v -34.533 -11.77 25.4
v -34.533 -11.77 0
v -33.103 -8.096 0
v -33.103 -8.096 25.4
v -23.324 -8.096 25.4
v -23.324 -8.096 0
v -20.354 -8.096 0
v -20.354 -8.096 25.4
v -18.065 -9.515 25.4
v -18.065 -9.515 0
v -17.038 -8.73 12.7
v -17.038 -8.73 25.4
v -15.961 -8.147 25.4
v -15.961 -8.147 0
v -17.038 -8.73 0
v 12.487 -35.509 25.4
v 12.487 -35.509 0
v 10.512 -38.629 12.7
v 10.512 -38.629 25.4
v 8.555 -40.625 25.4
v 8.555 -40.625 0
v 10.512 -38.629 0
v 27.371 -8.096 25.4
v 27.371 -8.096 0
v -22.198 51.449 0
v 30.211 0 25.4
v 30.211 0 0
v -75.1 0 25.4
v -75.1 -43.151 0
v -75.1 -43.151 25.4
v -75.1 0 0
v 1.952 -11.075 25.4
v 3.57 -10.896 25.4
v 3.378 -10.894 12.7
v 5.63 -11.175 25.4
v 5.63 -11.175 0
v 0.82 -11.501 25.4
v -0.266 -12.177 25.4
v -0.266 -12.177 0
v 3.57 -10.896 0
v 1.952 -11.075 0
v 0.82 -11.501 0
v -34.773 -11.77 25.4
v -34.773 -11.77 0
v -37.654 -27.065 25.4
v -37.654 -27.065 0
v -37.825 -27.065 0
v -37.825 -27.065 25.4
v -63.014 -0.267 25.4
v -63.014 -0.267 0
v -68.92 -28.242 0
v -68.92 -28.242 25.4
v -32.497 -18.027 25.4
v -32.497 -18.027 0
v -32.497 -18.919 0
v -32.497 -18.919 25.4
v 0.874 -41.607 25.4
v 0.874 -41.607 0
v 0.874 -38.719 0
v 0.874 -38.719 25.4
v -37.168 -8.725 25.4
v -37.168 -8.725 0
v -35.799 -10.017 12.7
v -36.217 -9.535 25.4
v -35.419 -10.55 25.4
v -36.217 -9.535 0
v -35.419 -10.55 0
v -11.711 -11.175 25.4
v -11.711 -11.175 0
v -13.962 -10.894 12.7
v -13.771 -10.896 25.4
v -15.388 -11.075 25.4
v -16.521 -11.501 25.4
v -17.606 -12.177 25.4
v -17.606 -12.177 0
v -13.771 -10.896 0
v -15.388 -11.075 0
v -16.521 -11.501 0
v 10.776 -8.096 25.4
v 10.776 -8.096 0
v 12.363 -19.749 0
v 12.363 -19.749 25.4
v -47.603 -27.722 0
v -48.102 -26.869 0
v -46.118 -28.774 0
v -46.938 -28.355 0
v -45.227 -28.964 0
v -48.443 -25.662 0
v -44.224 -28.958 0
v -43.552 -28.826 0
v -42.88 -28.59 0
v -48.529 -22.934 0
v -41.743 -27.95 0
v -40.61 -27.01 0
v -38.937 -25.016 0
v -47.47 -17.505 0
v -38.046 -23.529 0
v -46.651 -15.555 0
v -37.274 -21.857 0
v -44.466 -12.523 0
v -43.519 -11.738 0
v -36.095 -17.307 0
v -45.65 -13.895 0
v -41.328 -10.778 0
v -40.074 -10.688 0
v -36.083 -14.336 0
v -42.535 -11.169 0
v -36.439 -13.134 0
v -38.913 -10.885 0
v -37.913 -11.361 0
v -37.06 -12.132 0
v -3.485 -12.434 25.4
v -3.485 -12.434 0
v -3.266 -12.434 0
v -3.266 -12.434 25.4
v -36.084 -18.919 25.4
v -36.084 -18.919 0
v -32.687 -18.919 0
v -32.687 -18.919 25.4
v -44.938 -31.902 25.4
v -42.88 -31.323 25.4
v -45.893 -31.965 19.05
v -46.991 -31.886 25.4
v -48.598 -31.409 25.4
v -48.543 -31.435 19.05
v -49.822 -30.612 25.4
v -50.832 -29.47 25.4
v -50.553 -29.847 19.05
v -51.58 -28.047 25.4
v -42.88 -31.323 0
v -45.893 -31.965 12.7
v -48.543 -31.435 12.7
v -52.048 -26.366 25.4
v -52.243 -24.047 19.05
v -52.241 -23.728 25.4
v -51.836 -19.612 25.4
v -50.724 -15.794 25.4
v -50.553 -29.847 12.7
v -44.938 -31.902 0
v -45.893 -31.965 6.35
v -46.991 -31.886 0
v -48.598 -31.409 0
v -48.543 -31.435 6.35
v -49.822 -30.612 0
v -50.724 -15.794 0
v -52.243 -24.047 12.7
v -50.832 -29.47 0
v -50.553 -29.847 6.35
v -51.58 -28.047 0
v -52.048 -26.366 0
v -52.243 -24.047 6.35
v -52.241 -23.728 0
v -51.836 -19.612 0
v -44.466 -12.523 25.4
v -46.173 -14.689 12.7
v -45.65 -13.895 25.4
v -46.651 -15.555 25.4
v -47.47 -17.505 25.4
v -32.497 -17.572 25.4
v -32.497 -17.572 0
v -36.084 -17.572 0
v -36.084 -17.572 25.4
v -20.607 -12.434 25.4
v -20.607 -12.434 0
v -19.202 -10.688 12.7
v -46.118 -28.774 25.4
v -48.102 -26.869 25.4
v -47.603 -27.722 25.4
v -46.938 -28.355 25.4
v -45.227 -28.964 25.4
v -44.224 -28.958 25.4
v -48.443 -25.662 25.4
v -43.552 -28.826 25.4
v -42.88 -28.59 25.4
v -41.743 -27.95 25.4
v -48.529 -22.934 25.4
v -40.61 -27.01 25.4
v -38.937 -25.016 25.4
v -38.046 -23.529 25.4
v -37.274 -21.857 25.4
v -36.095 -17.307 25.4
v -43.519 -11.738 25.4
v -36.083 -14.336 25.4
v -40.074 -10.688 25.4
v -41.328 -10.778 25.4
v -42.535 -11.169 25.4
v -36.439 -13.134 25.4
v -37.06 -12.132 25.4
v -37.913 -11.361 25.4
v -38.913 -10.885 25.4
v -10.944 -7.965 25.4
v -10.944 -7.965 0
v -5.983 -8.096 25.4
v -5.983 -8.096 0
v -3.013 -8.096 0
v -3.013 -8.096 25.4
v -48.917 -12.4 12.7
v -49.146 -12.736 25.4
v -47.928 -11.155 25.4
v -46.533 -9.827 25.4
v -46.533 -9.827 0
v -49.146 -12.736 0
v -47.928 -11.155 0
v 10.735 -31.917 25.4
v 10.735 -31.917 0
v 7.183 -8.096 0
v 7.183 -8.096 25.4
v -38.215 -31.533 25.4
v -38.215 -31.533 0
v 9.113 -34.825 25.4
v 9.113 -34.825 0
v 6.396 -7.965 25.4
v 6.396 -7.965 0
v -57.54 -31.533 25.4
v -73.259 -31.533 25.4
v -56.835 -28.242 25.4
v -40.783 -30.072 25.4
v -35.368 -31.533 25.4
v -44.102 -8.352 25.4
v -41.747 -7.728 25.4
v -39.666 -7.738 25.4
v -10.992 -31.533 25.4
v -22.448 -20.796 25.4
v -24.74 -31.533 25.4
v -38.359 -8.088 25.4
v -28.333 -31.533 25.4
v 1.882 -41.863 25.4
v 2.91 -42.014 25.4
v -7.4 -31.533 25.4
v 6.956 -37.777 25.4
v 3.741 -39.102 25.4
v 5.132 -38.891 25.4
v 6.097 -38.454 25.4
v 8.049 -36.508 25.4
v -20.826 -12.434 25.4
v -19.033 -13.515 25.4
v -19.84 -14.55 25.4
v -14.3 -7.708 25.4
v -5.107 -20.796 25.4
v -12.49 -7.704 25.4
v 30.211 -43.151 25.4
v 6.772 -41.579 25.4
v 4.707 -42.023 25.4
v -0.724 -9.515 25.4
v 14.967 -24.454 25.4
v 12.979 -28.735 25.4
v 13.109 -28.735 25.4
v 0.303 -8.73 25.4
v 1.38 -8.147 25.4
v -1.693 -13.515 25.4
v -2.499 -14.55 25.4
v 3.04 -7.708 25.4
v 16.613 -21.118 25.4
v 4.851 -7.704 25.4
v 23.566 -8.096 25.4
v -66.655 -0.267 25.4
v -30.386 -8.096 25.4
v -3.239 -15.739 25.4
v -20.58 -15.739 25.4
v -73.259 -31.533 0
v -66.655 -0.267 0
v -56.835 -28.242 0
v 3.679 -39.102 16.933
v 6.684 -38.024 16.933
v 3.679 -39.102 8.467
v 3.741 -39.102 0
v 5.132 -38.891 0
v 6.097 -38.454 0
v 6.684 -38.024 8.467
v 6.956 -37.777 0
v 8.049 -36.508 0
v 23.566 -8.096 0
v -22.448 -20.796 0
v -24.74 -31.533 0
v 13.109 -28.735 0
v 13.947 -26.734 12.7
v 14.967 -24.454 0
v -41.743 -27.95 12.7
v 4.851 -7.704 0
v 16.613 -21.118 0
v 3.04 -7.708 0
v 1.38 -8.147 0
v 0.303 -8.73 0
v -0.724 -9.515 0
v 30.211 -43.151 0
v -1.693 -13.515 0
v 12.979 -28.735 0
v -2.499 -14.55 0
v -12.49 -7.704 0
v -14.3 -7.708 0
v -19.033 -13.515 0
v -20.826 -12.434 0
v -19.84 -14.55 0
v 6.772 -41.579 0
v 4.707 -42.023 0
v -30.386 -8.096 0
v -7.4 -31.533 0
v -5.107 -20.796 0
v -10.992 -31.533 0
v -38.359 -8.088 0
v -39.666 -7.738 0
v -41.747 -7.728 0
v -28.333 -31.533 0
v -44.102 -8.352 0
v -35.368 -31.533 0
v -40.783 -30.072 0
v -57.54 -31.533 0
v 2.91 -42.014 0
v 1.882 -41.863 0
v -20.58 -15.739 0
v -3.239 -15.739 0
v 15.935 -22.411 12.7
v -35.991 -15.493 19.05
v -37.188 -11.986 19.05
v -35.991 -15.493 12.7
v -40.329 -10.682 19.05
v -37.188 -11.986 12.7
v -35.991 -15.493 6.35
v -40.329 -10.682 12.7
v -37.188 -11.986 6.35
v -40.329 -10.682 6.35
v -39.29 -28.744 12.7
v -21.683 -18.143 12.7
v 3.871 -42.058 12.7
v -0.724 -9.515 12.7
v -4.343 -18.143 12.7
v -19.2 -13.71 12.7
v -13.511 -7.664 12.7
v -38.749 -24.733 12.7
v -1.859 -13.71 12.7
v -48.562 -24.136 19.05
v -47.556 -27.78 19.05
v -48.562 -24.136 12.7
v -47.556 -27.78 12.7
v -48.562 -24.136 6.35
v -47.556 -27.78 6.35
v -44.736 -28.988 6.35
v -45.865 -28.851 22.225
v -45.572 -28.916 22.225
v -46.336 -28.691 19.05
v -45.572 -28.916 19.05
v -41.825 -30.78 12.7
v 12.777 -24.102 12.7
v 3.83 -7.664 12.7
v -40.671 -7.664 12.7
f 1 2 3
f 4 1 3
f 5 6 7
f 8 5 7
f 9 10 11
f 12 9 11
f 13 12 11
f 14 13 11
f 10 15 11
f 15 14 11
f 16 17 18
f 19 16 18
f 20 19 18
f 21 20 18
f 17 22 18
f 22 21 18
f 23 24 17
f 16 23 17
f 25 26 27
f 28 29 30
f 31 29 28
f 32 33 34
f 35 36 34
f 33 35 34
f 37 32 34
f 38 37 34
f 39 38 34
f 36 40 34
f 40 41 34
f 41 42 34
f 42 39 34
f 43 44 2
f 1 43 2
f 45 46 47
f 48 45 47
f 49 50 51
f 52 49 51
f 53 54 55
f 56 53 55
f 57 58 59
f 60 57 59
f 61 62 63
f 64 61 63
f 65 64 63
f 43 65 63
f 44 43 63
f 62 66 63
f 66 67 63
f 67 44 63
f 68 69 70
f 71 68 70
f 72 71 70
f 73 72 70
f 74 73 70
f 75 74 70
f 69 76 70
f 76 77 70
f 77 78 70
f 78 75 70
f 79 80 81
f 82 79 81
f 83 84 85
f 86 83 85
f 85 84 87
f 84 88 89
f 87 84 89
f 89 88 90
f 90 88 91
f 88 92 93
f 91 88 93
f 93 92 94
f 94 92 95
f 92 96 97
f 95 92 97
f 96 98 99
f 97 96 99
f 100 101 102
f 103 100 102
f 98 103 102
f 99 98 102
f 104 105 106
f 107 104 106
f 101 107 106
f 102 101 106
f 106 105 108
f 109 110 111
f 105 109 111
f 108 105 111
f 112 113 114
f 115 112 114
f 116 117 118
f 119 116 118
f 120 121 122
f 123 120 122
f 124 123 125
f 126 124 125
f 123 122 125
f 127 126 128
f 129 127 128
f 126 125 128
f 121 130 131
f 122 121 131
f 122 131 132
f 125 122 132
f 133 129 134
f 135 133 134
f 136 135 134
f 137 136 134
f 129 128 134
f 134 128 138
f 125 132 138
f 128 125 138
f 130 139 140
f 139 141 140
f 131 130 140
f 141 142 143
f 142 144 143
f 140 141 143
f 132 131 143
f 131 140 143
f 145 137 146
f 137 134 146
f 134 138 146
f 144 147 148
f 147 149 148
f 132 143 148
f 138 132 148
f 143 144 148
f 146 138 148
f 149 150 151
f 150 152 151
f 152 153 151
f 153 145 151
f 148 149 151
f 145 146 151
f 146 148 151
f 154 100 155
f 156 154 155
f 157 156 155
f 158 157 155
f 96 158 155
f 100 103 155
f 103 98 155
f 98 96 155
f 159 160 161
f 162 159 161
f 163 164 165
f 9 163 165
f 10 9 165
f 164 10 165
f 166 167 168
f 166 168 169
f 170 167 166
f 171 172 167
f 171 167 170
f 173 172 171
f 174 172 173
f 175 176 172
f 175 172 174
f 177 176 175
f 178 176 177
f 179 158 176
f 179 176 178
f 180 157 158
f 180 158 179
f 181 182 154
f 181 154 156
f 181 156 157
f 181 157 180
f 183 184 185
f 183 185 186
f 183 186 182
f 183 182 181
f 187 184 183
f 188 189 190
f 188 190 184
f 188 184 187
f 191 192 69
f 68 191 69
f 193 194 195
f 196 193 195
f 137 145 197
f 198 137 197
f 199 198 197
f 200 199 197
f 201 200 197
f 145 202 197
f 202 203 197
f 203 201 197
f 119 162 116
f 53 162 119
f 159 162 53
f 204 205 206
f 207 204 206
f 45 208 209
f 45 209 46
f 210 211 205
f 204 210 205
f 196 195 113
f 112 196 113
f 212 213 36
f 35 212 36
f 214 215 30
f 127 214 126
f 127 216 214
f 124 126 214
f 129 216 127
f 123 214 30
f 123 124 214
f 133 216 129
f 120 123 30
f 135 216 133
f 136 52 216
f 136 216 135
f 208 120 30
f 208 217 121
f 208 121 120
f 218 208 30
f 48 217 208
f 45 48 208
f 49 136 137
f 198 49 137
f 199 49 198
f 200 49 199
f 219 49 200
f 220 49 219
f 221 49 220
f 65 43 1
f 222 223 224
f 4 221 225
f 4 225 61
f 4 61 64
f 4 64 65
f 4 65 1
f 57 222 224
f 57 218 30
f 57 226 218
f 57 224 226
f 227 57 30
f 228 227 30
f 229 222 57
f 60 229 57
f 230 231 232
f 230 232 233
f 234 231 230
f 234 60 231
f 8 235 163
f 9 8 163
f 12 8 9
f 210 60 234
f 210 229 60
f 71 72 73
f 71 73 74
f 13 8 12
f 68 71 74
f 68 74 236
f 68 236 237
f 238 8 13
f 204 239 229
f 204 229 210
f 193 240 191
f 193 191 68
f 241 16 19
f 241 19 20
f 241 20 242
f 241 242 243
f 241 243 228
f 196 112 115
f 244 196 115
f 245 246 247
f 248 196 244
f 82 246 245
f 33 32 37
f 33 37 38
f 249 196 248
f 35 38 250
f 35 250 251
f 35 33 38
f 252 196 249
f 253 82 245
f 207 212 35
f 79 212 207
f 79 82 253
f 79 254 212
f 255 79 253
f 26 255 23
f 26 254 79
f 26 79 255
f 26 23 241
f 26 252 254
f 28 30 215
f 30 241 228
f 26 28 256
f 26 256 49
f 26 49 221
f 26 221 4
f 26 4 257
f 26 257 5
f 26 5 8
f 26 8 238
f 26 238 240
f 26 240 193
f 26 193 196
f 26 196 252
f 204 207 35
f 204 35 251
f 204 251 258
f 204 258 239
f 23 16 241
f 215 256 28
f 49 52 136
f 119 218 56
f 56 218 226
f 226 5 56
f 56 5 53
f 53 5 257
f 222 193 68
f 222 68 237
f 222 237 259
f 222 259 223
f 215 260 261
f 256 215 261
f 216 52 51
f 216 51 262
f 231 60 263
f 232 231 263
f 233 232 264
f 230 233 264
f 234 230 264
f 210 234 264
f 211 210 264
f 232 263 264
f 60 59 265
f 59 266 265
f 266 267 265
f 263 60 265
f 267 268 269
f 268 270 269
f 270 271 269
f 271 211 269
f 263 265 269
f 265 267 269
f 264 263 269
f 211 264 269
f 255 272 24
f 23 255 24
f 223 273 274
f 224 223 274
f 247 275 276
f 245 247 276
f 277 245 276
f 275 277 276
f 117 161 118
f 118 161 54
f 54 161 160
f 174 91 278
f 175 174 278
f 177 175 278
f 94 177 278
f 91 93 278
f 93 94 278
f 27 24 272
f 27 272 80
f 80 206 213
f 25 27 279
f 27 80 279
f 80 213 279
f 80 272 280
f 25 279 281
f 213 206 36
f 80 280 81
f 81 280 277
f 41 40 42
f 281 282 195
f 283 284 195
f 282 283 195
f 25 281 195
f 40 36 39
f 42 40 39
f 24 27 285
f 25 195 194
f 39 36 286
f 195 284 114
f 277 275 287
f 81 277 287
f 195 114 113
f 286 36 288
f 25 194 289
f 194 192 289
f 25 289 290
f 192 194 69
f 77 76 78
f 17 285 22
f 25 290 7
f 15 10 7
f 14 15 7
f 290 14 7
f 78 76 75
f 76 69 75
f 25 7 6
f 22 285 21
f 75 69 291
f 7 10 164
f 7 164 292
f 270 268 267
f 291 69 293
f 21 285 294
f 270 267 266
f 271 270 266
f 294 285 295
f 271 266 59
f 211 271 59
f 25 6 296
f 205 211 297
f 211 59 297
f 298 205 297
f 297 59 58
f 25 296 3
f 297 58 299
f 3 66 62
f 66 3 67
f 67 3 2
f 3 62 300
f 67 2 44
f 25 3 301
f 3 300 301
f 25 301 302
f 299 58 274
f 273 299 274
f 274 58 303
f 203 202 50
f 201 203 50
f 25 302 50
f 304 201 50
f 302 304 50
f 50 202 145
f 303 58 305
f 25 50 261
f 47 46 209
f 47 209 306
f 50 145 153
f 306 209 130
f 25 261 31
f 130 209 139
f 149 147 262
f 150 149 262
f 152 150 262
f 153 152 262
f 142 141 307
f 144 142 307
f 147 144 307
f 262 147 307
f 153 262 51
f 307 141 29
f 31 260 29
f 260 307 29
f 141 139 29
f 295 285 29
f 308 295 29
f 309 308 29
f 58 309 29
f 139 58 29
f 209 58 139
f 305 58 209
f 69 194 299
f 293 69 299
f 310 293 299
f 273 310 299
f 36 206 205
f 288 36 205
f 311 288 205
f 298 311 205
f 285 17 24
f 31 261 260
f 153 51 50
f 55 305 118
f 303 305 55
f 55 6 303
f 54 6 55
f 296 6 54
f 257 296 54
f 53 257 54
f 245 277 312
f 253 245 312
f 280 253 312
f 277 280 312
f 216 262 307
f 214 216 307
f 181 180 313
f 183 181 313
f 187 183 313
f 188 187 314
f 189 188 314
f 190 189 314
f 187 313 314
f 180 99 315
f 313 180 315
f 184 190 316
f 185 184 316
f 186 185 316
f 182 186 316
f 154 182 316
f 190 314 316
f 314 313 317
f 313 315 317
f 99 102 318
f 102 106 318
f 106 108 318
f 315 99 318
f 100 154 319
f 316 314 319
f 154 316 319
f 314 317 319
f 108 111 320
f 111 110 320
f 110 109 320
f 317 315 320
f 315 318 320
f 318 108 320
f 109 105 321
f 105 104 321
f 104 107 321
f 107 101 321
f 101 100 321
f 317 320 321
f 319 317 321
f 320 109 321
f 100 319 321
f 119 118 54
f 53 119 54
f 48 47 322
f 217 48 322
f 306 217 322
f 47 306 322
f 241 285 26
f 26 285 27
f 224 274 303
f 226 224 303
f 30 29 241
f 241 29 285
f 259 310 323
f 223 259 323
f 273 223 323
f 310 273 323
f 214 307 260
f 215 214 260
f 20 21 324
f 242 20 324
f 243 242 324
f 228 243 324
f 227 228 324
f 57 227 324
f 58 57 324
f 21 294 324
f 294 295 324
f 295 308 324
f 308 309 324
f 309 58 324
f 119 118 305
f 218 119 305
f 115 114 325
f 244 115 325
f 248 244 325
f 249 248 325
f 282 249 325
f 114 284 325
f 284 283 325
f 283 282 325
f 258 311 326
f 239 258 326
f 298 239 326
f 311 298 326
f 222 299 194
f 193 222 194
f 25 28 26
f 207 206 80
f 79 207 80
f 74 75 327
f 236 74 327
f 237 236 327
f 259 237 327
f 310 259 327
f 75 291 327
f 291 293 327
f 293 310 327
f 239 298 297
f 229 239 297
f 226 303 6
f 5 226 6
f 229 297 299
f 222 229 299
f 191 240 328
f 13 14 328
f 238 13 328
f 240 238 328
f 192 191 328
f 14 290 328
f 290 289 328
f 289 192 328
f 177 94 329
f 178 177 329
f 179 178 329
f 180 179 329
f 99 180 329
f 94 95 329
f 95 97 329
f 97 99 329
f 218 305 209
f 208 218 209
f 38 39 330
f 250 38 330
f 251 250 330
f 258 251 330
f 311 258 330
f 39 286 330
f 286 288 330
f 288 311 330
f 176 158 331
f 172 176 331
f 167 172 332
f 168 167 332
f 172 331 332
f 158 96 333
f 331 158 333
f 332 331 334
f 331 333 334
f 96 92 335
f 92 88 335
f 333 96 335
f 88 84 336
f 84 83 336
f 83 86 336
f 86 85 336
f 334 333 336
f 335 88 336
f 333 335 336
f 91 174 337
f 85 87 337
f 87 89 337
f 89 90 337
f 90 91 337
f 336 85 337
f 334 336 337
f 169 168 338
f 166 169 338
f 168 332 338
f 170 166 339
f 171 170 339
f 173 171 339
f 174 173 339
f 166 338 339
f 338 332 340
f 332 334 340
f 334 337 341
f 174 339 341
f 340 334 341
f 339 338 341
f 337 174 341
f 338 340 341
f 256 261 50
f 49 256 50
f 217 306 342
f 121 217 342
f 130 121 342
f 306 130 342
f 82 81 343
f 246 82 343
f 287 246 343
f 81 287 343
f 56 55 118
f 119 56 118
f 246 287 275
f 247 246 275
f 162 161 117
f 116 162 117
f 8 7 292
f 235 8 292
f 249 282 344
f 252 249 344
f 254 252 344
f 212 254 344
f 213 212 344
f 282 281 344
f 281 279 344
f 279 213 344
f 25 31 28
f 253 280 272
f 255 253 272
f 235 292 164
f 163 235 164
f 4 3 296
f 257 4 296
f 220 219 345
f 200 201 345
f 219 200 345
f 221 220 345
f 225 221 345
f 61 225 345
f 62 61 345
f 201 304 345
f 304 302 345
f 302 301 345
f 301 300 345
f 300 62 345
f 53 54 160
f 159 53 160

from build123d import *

# Parameters (mm, degrees)
F0_W      = 105.3100518572
F0_H      = 43.1510657072
F1_DEPTH  = 25.4
F1_FACE_W = 105.3100518572
F1_FACE_H = 25.4


with BuildPart() as f1:
    # F0 (on Top) → F1 (new body)
    with BuildSketch(Plane.XY):
        with Locations((-22.4444870061, -21.5755328536)):
            Rectangle(F0_W, F0_H)
        with BuildLine():
            Line((10.7347830199, -31.9166990618), (7.1831606328, -8.0955092174))
            Line((7.1831606328, -8.0955092174), (10.7758422382, -8.0955092174))
            Line((10.7758422382, -8.0955092174), (12.3634653476, -19.7494840249))
            add(Edge.make_bspline(
                [(12.3634653476, -19.7494840249), (12.5756046424, -21.2276158854), (12.7774791326, -24.1017611697)],
                knots=[0, 0, 0, 1, 1, 1], degree=2))
            add(Edge.make_bspline(
                [(12.7774791326, -24.1017611697), (12.9793536228, -26.975906454), (12.9793536228, -28.7346096399)],
                knots=[0, 0, 0, 1, 1, 1], degree=2))
            Line((12.9793536228, -28.7346096399), (13.1093744809, -28.7346096399))
            add(Edge.make_bspline(
                [(13.1093744809, -28.7346096399), (13.8552836142, -26.8732584082), (14.9673041111, -24.4541861272)],
                knots=[0, 0, 0, 1, 1, 1], degree=2))
            add(Edge.make_bspline(
                [(14.9673041111, -24.4541861272), (16.079324608, -22.0351138463), (16.6130944466, -21.1181246365)],
                knots=[0, 0, 0, 1, 1, 1], degree=2))
            Line((16.6130944466, -21.1181246365), (23.5657887533, -8.0955092174))
            Line((23.5657887533, -8.0955092174), (27.3706096535, -8.0955092174))
            Line((27.3706096535, -8.0955092174), (12.4866430027, -35.5093806672))
            add(Edge.make_bspline(
                [(12.4866430027, -35.5093806672), (10.5021141159, -39.1910239123), (8.5552228459, -40.6246749529)],
                knots=[0, 0, 0, 1, 1, 1], degree=2))
            add(Edge.make_bspline(
                [(8.5552228459, -40.6246749529), (6.608331576, -42.0583259935), (3.8710503529, -42.0583259935)],
                knots=[0, 0, 0, 1, 1, 1], degree=2))
            add(Edge.make_bspline(
                [(3.8710503529, -42.0583259935), (2.3313296648, -42.0583259935), (0.8737274135, -41.6066745917)],
                knots=[0, 0, 0, 1, 1, 1], degree=2))
            Line((0.8737274135, -41.6066745917), (0.8737274135, -38.7188429013))
            add(Edge.make_bspline(
                [(0.8737274135, -38.7188429013), (2.2218384159, -39.1020622725), (3.6794406672, -39.1020622725)],
                knots=[0, 0, 0, 1, 1, 1], degree=2))
            add(Edge.make_bspline(
                [(3.6794406672, -39.1020622725), (5.43130065, -39.1020622725), (6.6836068096, -38.0242577909)],
                knots=[0, 0, 0, 1, 1, 1], degree=2))
            add(Edge.make_bspline(
                [(6.6836068096, -38.0242577909), (7.9359129692, -36.9464533093), (9.1129438952, -34.8250603614)],
                knots=[0, 0, 0, 1, 1, 1], degree=2))
            Line((9.1129438952, -34.8250603614), (10.7347830199, -31.9166990618))
        make_face(mode=Mode.SUBTRACT)
        Polygon((-57.5398538883, -31.5334796906), (-73.2586913121, -31.5334796906), (-66.6550003613, -0.2668849193), (-63.0144163345, -0.2668849193), (-68.9201005735, -28.2418990197), (-56.8350039733, -28.2418990197), align=None, mode=Mode.SUBTRACT)
        with BuildLine():
            add(Edge.make_bspline(
                [(-40.7834376307, -30.072049337), (-41.8182234846, -30.862783876), (-42.8802333772, -31.323138556)],
                knots=[0.3785049089, 0.3785049089, 0.3785049089, 0.638174179, 0.638174179, 0.638174179], degree=2))
            add(Edge.make_bspline(
                [(-42.8802333772, -31.323138556), (-44.3600488412, -31.9646014832), (-45.8927222838, -31.9646014832)],
                knots=[0.638174179, 0.638174179, 0.638174179, 1, 1, 1], degree=2))
            add(Edge.make_bspline(
                [(-45.8927222838, -31.9646014832), (-48.8626724109, -31.9646014832), (-50.5529435662, -29.8466301368)],
                knots=[0, 0, 0, 1, 1, 1], degree=2))
            add(Edge.make_bspline(
                [(-50.5529435662, -29.8466301368), (-52.2432147215, -27.7286587904), (-52.2432147215, -24.0470155453)],
                knots=[0, 0, 0, 1, 1, 1], degree=2))
            add(Edge.make_bspline(
                [(-52.2432147215, -24.0470155453), (-52.2432147215, -19.5989335577), (-50.7240236426, -15.7941126575)],
                knots=[0, 0, 0, 1, 1, 1], degree=2))
            add(Edge.make_bspline(
                [(-50.7240236426, -15.7941126575), (-49.2048325638, -11.9892917573), (-46.5325617697, -9.8268395911)],
                knots=[0, 0, 0, 1, 1, 1], degree=2))
            add(Edge.make_bspline(
                [(-46.5325617697, -9.8268395911), (-43.8602909756, -7.6643874248), (-40.6713583507, -7.6643874248)],
                knots=[0, 0, 0, 1, 1, 1], degree=2))
            add(Edge.make_bspline(
                [(-40.6713583507, -7.6643874248), (-38.7073590731, -7.6643874248), (-37.167638385, -8.7250838988)],
                knots=[0, 0, 0, 1, 1, 1], degree=2))
            add(Edge.make_bspline(
                [(-37.167638385, -8.7250838988), (-35.627917697, -9.7857803727), (-34.7725173148, -11.7703092595)],
                knots=[0, 0, 0, 1, 1, 1], degree=2))
            Line((-34.7725173148, -11.7703092595), (-34.5330052078, -11.7703092595))
            Line((-34.5330052078, -11.7703092595), (-33.1027757687, -8.0955092174))
            Line((-33.1027757687, -8.0955092174), (-30.3860241547, -8.0955092174))
            Line((-30.3860241547, -8.0955092174), (-32.4969105422, -18.0265337741))
            Line((-32.4969105422, -18.0265337741), (-32.4969105422, -18.9186204225))
            Line((-32.4969105422, -18.9186204225), (-32.6865277919, -18.9186204225))
            Line((-32.6865277919, -18.9186204225), (-35.3678759808, -31.5334796906))
            Line((-35.3678759808, -31.5334796906), (-38.2146484529, -31.5334796906))
            Line((-38.2146484529, -31.5334796906), (-37.6535058022, -27.0648680938))
            Line((-37.6535058022, -27.0648680938), (-37.8245858786, -27.0648680938))
            add(Edge.make_bspline(
                [(-37.8245858786, -27.0648680938), (-39.2750900108, -28.9194412342), (-40.7834376307, -30.072049337)],
                knots=[0, 0, 0, 0.3785049089, 0.3785049089, 0.3785049089], degree=2))
        make_face(mode=Mode.SUBTRACT)
        with BuildLine():
            add(Edge.make_bspline(
                [(-15.9605521088, -8.1468332404), (-14.8587964165, -7.6643874248), (-13.5106854141, -7.6643874248)],
                knots=[0, 0, 0, 1, 1, 1], degree=2))
            add(Edge.make_bspline(
                [(-13.5106854141, -7.6643874248), (-12.0325535536, -7.6643874248), (-10.9444842674, -7.9654883593)],
                knots=[0, 0, 0, 1, 1, 1], degree=2))
            Line((-10.9444842674, -7.9654883593), (-11.7109230099, -11.1749505935))
            add(Edge.make_bspline(
                [(-11.7109230099, -11.1749505935), (-12.8468947175, -10.8943792681), (-13.9623368159, -10.8943792681)],
                knots=[0, 0, 0, 1, 1, 1], degree=2))
            add(Edge.make_bspline(
                [(-13.9623368159, -10.8943792681), (-15.9058064843, -10.8943792681), (-17.6063424442, -12.1774798414)],
                knots=[0, 0, 0, 1, 1, 1], degree=2))
            add(Edge.make_bspline(
                [(-17.6063424442, -12.1774798414), (-19.3068784041, -13.4605804148), (-20.5797141728, -15.739367033)],
                knots=[0, 0, 0, 1, 1, 1], degree=2))
            add(Edge.make_bspline(
                [(-20.5797141728, -15.739367033), (-21.8525499416, -18.0181536513), (-22.4479086076, -20.7964940928)],
                knots=[0, 0, 0, 1, 1, 1], degree=2))
            Line((-22.4479086076, -20.7964940928), (-24.740381632, -31.5334796906))
            Line((-24.740381632, -31.5334796906), (-28.3330632374, -31.5334796906))
            Line((-28.3330632374, -31.5334796906), (-23.323838599, -8.0955092174))
            Line((-23.323838599, -8.0955092174), (-20.3538884719, -8.0955092174))
            Line((-20.3538884719, -8.0955092174), (-20.8260694829, -12.4340999561))
            Line((-20.8260694829, -12.4340999561), (-20.6070869851, -12.4340999561))
            add(Edge.make_bspline(
                [(-20.6070869851, -12.4340999561), (-19.067366297, -10.4016686479), (-18.0648370491, -9.5154738519)],
                knots=[0, 0, 0, 1, 1, 1], degree=2))
            add(Edge.make_bspline(
                [(-18.0648370491, -9.5154738519), (-17.0623078011, -8.6292790559), (-15.9605521088, -8.1468332404)],
                knots=[0, 0, 0, 1, 1, 1], degree=2))
        make_face(mode=Mode.SUBTRACT)
        with BuildLine():
            add(Edge.make_bspline(
                [(1.3801244398, -8.1468332404), (2.4818801321, -7.6643874248), (3.8299911345, -7.6643874248)],
                knots=[0, 0, 0, 1, 1, 1], degree=2))
            add(Edge.make_bspline(
                [(3.8299911345, -7.6643874248), (5.308122995, -7.6643874248), (6.3961922812, -7.9654883593)],
                knots=[0, 0, 0, 1, 1, 1], degree=2))
            Line((6.3961922812, -7.9654883593), (5.6297535387, -11.1749505935))
            add(Edge.make_bspline(
                [(5.6297535387, -11.1749505935), (4.4937818311, -10.8943792681), (3.3783397327, -10.8943792681)],
                knots=[0, 0, 0, 1, 1, 1], degree=2))
            add(Edge.make_bspline(
                [(3.3783397327, -10.8943792681), (1.4348700643, -10.8943792681), (-0.2656658956, -12.1774798414)],
                knots=[0, 0, 0, 1, 1, 1], degree=2))
            add(Edge.make_bspline(
                [(-0.2656658956, -12.1774798414), (-1.9662018555, -13.4605804148), (-3.2390376242, -15.739367033)],
                knots=[0, 0, 0, 1, 1, 1], degree=2))
            add(Edge.make_bspline(
                [(-3.2390376242, -15.739367033), (-4.511873393, -18.0181536513), (-5.107232059, -20.7964940928)],
                knots=[0, 0, 0, 1, 1, 1], degree=2))
            Line((-5.107232059, -20.7964940928), (-7.3997050834, -31.5334796906))
            Line((-7.3997050834, -31.5334796906), (-10.9923866888, -31.5334796906))
            Line((-10.9923866888, -31.5334796906), (-5.9831620504, -8.0955092174))
            Line((-5.9831620504, -8.0955092174), (-3.0132119233, -8.0955092174))
            Line((-3.0132119233, -8.0955092174), (-3.4853929343, -12.4340999561))
            Line((-3.4853929343, -12.4340999561), (-3.2664104365, -12.4340999561))
            add(Edge.make_bspline(
                [(-3.2664104365, -12.4340999561), (-1.7266897485, -10.4016686479), (-0.7241605005, -9.5154738519)],
                knots=[0, 0, 0, 1, 1, 1], degree=2))
            add(Edge.make_bspline(
                [(-0.7241605005, -9.5154738519), (0.2783687475, -8.6292790559), (1.3801244398, -8.1468332404)],
                knots=[0, 0, 0, 1, 1, 1], degree=2))
        make_face(mode=Mode.SUBTRACT)
    extrude(amount=F1_DEPTH)

    # F1_face (on face) → F3 section 0
    with BuildSketch(Plane(origin=(-22.4444870061, 0, 12.7), x_dir=(-1, 0, 0), z_dir=(0, 1, 0)), mode=Mode.PRIVATE) as f3_s0:
        Rectangle(F1_FACE_W, F1_FACE_H)
    loft([Vertex(-22.1979394555, 51.449380815, 0), f3_s0.sketch])


with BuildPart() as f1b:
    # F0 (on Top) → F1, piece 2 (new body)
    with BuildSketch(Plane.XY):
        Polygon((-36.084137857, -18.9186204225), (-32.6865277919, -18.9186204225), (-32.4969105422, -18.0265337741), (-32.4969105422, -17.5723396242), (-36.084137857, -17.5723396242), align=None)
    extrude(amount=F1_DEPTH)


with BuildPart() as f1c:
    # F0 (on Top) → F1, piece 3 (new body)
    with BuildSketch(Plane.XY):
        with BuildLine():
            add(Edge.make_bspline(
                [(-44.736220967, -28.987808153), (-43.8061619461, -28.987808153), (-42.8802333772, -28.5899079344)],
                knots=[0, 0, 0, 0.448547514, 0.448547514, 0.448547514], degree=2))
            add(Edge.make_bspline(
                [(-42.8802333772, -28.5899079344), (-41.7418799247, -28.1007221562), (-40.6097695231, -27.0101224693)],
                knots=[0.448547514, 0.448547514, 0.448547514, 1, 1, 1], degree=2))
            add(Edge.make_bspline(
                [(-40.6097695231, -27.0101224693), (-38.5568086058, -25.0324367856), (-37.2737080324, -21.8571905668)],
                knots=[0, 0, 0, 1, 1, 1], degree=2))
            add(Edge.make_bspline(
                [(-37.2737080324, -21.8571905668), (-35.9906074591, -18.6819443479), (-35.9906074591, -15.493011723)],
                knots=[0, 0, 0, 1, 1, 1], degree=2))
            add(Edge.make_bspline(
                [(-35.9906074591, -15.493011723), (-35.9906074591, -13.2895003383), (-37.1881679942, -11.9858701558)],
                knots=[0, 0, 0, 1, 1, 1], degree=2))
            add(Edge.make_bspline(
                [(-37.1881679942, -11.9858701558), (-38.3857285293, -10.6822399733), (-40.3291981978, -10.6822399733)],
                knots=[0, 0, 0, 1, 1, 1], degree=2))
            add(Edge.make_bspline(
                [(-40.3291981978, -10.6822399733), (-42.5532391916, -10.6822399733), (-44.4659144462, -12.5230615959)],
                knots=[0, 0, 0, 1, 1, 1], degree=2))
            add(Edge.make_bspline(
                [(-44.4659144462, -12.5230615959), (-46.3785897009, -14.3638832184), (-47.4700805886, -17.504913422)],
                knots=[0, 0, 0, 1, 1, 1], degree=2))
            add(Edge.make_bspline(
                [(-47.4700805886, -17.504913422), (-48.5615714764, -20.6459436255), (-48.5615714764, -24.135977185)],
                knots=[0, 0, 0, 1, 1, 1], degree=2))
            add(Edge.make_bspline(
                [(-48.5615714764, -24.135977185), (-48.5615714764, -26.5721574736), (-47.5556206269, -27.7799828133)],
                knots=[0, 0, 0, 1, 1, 1], degree=2))
            add(Edge.make_bspline(
                [(-47.5556206269, -27.7799828133), (-46.5496697774, -28.987808153), (-44.736220967, -28.987808153)],
                knots=[0, 0, 0, 1, 1, 1], degree=2))
        make_face()
    extrude(amount=F1_DEPTH)


solid = Compound([f1.part, f1b.part, f1c.part])
